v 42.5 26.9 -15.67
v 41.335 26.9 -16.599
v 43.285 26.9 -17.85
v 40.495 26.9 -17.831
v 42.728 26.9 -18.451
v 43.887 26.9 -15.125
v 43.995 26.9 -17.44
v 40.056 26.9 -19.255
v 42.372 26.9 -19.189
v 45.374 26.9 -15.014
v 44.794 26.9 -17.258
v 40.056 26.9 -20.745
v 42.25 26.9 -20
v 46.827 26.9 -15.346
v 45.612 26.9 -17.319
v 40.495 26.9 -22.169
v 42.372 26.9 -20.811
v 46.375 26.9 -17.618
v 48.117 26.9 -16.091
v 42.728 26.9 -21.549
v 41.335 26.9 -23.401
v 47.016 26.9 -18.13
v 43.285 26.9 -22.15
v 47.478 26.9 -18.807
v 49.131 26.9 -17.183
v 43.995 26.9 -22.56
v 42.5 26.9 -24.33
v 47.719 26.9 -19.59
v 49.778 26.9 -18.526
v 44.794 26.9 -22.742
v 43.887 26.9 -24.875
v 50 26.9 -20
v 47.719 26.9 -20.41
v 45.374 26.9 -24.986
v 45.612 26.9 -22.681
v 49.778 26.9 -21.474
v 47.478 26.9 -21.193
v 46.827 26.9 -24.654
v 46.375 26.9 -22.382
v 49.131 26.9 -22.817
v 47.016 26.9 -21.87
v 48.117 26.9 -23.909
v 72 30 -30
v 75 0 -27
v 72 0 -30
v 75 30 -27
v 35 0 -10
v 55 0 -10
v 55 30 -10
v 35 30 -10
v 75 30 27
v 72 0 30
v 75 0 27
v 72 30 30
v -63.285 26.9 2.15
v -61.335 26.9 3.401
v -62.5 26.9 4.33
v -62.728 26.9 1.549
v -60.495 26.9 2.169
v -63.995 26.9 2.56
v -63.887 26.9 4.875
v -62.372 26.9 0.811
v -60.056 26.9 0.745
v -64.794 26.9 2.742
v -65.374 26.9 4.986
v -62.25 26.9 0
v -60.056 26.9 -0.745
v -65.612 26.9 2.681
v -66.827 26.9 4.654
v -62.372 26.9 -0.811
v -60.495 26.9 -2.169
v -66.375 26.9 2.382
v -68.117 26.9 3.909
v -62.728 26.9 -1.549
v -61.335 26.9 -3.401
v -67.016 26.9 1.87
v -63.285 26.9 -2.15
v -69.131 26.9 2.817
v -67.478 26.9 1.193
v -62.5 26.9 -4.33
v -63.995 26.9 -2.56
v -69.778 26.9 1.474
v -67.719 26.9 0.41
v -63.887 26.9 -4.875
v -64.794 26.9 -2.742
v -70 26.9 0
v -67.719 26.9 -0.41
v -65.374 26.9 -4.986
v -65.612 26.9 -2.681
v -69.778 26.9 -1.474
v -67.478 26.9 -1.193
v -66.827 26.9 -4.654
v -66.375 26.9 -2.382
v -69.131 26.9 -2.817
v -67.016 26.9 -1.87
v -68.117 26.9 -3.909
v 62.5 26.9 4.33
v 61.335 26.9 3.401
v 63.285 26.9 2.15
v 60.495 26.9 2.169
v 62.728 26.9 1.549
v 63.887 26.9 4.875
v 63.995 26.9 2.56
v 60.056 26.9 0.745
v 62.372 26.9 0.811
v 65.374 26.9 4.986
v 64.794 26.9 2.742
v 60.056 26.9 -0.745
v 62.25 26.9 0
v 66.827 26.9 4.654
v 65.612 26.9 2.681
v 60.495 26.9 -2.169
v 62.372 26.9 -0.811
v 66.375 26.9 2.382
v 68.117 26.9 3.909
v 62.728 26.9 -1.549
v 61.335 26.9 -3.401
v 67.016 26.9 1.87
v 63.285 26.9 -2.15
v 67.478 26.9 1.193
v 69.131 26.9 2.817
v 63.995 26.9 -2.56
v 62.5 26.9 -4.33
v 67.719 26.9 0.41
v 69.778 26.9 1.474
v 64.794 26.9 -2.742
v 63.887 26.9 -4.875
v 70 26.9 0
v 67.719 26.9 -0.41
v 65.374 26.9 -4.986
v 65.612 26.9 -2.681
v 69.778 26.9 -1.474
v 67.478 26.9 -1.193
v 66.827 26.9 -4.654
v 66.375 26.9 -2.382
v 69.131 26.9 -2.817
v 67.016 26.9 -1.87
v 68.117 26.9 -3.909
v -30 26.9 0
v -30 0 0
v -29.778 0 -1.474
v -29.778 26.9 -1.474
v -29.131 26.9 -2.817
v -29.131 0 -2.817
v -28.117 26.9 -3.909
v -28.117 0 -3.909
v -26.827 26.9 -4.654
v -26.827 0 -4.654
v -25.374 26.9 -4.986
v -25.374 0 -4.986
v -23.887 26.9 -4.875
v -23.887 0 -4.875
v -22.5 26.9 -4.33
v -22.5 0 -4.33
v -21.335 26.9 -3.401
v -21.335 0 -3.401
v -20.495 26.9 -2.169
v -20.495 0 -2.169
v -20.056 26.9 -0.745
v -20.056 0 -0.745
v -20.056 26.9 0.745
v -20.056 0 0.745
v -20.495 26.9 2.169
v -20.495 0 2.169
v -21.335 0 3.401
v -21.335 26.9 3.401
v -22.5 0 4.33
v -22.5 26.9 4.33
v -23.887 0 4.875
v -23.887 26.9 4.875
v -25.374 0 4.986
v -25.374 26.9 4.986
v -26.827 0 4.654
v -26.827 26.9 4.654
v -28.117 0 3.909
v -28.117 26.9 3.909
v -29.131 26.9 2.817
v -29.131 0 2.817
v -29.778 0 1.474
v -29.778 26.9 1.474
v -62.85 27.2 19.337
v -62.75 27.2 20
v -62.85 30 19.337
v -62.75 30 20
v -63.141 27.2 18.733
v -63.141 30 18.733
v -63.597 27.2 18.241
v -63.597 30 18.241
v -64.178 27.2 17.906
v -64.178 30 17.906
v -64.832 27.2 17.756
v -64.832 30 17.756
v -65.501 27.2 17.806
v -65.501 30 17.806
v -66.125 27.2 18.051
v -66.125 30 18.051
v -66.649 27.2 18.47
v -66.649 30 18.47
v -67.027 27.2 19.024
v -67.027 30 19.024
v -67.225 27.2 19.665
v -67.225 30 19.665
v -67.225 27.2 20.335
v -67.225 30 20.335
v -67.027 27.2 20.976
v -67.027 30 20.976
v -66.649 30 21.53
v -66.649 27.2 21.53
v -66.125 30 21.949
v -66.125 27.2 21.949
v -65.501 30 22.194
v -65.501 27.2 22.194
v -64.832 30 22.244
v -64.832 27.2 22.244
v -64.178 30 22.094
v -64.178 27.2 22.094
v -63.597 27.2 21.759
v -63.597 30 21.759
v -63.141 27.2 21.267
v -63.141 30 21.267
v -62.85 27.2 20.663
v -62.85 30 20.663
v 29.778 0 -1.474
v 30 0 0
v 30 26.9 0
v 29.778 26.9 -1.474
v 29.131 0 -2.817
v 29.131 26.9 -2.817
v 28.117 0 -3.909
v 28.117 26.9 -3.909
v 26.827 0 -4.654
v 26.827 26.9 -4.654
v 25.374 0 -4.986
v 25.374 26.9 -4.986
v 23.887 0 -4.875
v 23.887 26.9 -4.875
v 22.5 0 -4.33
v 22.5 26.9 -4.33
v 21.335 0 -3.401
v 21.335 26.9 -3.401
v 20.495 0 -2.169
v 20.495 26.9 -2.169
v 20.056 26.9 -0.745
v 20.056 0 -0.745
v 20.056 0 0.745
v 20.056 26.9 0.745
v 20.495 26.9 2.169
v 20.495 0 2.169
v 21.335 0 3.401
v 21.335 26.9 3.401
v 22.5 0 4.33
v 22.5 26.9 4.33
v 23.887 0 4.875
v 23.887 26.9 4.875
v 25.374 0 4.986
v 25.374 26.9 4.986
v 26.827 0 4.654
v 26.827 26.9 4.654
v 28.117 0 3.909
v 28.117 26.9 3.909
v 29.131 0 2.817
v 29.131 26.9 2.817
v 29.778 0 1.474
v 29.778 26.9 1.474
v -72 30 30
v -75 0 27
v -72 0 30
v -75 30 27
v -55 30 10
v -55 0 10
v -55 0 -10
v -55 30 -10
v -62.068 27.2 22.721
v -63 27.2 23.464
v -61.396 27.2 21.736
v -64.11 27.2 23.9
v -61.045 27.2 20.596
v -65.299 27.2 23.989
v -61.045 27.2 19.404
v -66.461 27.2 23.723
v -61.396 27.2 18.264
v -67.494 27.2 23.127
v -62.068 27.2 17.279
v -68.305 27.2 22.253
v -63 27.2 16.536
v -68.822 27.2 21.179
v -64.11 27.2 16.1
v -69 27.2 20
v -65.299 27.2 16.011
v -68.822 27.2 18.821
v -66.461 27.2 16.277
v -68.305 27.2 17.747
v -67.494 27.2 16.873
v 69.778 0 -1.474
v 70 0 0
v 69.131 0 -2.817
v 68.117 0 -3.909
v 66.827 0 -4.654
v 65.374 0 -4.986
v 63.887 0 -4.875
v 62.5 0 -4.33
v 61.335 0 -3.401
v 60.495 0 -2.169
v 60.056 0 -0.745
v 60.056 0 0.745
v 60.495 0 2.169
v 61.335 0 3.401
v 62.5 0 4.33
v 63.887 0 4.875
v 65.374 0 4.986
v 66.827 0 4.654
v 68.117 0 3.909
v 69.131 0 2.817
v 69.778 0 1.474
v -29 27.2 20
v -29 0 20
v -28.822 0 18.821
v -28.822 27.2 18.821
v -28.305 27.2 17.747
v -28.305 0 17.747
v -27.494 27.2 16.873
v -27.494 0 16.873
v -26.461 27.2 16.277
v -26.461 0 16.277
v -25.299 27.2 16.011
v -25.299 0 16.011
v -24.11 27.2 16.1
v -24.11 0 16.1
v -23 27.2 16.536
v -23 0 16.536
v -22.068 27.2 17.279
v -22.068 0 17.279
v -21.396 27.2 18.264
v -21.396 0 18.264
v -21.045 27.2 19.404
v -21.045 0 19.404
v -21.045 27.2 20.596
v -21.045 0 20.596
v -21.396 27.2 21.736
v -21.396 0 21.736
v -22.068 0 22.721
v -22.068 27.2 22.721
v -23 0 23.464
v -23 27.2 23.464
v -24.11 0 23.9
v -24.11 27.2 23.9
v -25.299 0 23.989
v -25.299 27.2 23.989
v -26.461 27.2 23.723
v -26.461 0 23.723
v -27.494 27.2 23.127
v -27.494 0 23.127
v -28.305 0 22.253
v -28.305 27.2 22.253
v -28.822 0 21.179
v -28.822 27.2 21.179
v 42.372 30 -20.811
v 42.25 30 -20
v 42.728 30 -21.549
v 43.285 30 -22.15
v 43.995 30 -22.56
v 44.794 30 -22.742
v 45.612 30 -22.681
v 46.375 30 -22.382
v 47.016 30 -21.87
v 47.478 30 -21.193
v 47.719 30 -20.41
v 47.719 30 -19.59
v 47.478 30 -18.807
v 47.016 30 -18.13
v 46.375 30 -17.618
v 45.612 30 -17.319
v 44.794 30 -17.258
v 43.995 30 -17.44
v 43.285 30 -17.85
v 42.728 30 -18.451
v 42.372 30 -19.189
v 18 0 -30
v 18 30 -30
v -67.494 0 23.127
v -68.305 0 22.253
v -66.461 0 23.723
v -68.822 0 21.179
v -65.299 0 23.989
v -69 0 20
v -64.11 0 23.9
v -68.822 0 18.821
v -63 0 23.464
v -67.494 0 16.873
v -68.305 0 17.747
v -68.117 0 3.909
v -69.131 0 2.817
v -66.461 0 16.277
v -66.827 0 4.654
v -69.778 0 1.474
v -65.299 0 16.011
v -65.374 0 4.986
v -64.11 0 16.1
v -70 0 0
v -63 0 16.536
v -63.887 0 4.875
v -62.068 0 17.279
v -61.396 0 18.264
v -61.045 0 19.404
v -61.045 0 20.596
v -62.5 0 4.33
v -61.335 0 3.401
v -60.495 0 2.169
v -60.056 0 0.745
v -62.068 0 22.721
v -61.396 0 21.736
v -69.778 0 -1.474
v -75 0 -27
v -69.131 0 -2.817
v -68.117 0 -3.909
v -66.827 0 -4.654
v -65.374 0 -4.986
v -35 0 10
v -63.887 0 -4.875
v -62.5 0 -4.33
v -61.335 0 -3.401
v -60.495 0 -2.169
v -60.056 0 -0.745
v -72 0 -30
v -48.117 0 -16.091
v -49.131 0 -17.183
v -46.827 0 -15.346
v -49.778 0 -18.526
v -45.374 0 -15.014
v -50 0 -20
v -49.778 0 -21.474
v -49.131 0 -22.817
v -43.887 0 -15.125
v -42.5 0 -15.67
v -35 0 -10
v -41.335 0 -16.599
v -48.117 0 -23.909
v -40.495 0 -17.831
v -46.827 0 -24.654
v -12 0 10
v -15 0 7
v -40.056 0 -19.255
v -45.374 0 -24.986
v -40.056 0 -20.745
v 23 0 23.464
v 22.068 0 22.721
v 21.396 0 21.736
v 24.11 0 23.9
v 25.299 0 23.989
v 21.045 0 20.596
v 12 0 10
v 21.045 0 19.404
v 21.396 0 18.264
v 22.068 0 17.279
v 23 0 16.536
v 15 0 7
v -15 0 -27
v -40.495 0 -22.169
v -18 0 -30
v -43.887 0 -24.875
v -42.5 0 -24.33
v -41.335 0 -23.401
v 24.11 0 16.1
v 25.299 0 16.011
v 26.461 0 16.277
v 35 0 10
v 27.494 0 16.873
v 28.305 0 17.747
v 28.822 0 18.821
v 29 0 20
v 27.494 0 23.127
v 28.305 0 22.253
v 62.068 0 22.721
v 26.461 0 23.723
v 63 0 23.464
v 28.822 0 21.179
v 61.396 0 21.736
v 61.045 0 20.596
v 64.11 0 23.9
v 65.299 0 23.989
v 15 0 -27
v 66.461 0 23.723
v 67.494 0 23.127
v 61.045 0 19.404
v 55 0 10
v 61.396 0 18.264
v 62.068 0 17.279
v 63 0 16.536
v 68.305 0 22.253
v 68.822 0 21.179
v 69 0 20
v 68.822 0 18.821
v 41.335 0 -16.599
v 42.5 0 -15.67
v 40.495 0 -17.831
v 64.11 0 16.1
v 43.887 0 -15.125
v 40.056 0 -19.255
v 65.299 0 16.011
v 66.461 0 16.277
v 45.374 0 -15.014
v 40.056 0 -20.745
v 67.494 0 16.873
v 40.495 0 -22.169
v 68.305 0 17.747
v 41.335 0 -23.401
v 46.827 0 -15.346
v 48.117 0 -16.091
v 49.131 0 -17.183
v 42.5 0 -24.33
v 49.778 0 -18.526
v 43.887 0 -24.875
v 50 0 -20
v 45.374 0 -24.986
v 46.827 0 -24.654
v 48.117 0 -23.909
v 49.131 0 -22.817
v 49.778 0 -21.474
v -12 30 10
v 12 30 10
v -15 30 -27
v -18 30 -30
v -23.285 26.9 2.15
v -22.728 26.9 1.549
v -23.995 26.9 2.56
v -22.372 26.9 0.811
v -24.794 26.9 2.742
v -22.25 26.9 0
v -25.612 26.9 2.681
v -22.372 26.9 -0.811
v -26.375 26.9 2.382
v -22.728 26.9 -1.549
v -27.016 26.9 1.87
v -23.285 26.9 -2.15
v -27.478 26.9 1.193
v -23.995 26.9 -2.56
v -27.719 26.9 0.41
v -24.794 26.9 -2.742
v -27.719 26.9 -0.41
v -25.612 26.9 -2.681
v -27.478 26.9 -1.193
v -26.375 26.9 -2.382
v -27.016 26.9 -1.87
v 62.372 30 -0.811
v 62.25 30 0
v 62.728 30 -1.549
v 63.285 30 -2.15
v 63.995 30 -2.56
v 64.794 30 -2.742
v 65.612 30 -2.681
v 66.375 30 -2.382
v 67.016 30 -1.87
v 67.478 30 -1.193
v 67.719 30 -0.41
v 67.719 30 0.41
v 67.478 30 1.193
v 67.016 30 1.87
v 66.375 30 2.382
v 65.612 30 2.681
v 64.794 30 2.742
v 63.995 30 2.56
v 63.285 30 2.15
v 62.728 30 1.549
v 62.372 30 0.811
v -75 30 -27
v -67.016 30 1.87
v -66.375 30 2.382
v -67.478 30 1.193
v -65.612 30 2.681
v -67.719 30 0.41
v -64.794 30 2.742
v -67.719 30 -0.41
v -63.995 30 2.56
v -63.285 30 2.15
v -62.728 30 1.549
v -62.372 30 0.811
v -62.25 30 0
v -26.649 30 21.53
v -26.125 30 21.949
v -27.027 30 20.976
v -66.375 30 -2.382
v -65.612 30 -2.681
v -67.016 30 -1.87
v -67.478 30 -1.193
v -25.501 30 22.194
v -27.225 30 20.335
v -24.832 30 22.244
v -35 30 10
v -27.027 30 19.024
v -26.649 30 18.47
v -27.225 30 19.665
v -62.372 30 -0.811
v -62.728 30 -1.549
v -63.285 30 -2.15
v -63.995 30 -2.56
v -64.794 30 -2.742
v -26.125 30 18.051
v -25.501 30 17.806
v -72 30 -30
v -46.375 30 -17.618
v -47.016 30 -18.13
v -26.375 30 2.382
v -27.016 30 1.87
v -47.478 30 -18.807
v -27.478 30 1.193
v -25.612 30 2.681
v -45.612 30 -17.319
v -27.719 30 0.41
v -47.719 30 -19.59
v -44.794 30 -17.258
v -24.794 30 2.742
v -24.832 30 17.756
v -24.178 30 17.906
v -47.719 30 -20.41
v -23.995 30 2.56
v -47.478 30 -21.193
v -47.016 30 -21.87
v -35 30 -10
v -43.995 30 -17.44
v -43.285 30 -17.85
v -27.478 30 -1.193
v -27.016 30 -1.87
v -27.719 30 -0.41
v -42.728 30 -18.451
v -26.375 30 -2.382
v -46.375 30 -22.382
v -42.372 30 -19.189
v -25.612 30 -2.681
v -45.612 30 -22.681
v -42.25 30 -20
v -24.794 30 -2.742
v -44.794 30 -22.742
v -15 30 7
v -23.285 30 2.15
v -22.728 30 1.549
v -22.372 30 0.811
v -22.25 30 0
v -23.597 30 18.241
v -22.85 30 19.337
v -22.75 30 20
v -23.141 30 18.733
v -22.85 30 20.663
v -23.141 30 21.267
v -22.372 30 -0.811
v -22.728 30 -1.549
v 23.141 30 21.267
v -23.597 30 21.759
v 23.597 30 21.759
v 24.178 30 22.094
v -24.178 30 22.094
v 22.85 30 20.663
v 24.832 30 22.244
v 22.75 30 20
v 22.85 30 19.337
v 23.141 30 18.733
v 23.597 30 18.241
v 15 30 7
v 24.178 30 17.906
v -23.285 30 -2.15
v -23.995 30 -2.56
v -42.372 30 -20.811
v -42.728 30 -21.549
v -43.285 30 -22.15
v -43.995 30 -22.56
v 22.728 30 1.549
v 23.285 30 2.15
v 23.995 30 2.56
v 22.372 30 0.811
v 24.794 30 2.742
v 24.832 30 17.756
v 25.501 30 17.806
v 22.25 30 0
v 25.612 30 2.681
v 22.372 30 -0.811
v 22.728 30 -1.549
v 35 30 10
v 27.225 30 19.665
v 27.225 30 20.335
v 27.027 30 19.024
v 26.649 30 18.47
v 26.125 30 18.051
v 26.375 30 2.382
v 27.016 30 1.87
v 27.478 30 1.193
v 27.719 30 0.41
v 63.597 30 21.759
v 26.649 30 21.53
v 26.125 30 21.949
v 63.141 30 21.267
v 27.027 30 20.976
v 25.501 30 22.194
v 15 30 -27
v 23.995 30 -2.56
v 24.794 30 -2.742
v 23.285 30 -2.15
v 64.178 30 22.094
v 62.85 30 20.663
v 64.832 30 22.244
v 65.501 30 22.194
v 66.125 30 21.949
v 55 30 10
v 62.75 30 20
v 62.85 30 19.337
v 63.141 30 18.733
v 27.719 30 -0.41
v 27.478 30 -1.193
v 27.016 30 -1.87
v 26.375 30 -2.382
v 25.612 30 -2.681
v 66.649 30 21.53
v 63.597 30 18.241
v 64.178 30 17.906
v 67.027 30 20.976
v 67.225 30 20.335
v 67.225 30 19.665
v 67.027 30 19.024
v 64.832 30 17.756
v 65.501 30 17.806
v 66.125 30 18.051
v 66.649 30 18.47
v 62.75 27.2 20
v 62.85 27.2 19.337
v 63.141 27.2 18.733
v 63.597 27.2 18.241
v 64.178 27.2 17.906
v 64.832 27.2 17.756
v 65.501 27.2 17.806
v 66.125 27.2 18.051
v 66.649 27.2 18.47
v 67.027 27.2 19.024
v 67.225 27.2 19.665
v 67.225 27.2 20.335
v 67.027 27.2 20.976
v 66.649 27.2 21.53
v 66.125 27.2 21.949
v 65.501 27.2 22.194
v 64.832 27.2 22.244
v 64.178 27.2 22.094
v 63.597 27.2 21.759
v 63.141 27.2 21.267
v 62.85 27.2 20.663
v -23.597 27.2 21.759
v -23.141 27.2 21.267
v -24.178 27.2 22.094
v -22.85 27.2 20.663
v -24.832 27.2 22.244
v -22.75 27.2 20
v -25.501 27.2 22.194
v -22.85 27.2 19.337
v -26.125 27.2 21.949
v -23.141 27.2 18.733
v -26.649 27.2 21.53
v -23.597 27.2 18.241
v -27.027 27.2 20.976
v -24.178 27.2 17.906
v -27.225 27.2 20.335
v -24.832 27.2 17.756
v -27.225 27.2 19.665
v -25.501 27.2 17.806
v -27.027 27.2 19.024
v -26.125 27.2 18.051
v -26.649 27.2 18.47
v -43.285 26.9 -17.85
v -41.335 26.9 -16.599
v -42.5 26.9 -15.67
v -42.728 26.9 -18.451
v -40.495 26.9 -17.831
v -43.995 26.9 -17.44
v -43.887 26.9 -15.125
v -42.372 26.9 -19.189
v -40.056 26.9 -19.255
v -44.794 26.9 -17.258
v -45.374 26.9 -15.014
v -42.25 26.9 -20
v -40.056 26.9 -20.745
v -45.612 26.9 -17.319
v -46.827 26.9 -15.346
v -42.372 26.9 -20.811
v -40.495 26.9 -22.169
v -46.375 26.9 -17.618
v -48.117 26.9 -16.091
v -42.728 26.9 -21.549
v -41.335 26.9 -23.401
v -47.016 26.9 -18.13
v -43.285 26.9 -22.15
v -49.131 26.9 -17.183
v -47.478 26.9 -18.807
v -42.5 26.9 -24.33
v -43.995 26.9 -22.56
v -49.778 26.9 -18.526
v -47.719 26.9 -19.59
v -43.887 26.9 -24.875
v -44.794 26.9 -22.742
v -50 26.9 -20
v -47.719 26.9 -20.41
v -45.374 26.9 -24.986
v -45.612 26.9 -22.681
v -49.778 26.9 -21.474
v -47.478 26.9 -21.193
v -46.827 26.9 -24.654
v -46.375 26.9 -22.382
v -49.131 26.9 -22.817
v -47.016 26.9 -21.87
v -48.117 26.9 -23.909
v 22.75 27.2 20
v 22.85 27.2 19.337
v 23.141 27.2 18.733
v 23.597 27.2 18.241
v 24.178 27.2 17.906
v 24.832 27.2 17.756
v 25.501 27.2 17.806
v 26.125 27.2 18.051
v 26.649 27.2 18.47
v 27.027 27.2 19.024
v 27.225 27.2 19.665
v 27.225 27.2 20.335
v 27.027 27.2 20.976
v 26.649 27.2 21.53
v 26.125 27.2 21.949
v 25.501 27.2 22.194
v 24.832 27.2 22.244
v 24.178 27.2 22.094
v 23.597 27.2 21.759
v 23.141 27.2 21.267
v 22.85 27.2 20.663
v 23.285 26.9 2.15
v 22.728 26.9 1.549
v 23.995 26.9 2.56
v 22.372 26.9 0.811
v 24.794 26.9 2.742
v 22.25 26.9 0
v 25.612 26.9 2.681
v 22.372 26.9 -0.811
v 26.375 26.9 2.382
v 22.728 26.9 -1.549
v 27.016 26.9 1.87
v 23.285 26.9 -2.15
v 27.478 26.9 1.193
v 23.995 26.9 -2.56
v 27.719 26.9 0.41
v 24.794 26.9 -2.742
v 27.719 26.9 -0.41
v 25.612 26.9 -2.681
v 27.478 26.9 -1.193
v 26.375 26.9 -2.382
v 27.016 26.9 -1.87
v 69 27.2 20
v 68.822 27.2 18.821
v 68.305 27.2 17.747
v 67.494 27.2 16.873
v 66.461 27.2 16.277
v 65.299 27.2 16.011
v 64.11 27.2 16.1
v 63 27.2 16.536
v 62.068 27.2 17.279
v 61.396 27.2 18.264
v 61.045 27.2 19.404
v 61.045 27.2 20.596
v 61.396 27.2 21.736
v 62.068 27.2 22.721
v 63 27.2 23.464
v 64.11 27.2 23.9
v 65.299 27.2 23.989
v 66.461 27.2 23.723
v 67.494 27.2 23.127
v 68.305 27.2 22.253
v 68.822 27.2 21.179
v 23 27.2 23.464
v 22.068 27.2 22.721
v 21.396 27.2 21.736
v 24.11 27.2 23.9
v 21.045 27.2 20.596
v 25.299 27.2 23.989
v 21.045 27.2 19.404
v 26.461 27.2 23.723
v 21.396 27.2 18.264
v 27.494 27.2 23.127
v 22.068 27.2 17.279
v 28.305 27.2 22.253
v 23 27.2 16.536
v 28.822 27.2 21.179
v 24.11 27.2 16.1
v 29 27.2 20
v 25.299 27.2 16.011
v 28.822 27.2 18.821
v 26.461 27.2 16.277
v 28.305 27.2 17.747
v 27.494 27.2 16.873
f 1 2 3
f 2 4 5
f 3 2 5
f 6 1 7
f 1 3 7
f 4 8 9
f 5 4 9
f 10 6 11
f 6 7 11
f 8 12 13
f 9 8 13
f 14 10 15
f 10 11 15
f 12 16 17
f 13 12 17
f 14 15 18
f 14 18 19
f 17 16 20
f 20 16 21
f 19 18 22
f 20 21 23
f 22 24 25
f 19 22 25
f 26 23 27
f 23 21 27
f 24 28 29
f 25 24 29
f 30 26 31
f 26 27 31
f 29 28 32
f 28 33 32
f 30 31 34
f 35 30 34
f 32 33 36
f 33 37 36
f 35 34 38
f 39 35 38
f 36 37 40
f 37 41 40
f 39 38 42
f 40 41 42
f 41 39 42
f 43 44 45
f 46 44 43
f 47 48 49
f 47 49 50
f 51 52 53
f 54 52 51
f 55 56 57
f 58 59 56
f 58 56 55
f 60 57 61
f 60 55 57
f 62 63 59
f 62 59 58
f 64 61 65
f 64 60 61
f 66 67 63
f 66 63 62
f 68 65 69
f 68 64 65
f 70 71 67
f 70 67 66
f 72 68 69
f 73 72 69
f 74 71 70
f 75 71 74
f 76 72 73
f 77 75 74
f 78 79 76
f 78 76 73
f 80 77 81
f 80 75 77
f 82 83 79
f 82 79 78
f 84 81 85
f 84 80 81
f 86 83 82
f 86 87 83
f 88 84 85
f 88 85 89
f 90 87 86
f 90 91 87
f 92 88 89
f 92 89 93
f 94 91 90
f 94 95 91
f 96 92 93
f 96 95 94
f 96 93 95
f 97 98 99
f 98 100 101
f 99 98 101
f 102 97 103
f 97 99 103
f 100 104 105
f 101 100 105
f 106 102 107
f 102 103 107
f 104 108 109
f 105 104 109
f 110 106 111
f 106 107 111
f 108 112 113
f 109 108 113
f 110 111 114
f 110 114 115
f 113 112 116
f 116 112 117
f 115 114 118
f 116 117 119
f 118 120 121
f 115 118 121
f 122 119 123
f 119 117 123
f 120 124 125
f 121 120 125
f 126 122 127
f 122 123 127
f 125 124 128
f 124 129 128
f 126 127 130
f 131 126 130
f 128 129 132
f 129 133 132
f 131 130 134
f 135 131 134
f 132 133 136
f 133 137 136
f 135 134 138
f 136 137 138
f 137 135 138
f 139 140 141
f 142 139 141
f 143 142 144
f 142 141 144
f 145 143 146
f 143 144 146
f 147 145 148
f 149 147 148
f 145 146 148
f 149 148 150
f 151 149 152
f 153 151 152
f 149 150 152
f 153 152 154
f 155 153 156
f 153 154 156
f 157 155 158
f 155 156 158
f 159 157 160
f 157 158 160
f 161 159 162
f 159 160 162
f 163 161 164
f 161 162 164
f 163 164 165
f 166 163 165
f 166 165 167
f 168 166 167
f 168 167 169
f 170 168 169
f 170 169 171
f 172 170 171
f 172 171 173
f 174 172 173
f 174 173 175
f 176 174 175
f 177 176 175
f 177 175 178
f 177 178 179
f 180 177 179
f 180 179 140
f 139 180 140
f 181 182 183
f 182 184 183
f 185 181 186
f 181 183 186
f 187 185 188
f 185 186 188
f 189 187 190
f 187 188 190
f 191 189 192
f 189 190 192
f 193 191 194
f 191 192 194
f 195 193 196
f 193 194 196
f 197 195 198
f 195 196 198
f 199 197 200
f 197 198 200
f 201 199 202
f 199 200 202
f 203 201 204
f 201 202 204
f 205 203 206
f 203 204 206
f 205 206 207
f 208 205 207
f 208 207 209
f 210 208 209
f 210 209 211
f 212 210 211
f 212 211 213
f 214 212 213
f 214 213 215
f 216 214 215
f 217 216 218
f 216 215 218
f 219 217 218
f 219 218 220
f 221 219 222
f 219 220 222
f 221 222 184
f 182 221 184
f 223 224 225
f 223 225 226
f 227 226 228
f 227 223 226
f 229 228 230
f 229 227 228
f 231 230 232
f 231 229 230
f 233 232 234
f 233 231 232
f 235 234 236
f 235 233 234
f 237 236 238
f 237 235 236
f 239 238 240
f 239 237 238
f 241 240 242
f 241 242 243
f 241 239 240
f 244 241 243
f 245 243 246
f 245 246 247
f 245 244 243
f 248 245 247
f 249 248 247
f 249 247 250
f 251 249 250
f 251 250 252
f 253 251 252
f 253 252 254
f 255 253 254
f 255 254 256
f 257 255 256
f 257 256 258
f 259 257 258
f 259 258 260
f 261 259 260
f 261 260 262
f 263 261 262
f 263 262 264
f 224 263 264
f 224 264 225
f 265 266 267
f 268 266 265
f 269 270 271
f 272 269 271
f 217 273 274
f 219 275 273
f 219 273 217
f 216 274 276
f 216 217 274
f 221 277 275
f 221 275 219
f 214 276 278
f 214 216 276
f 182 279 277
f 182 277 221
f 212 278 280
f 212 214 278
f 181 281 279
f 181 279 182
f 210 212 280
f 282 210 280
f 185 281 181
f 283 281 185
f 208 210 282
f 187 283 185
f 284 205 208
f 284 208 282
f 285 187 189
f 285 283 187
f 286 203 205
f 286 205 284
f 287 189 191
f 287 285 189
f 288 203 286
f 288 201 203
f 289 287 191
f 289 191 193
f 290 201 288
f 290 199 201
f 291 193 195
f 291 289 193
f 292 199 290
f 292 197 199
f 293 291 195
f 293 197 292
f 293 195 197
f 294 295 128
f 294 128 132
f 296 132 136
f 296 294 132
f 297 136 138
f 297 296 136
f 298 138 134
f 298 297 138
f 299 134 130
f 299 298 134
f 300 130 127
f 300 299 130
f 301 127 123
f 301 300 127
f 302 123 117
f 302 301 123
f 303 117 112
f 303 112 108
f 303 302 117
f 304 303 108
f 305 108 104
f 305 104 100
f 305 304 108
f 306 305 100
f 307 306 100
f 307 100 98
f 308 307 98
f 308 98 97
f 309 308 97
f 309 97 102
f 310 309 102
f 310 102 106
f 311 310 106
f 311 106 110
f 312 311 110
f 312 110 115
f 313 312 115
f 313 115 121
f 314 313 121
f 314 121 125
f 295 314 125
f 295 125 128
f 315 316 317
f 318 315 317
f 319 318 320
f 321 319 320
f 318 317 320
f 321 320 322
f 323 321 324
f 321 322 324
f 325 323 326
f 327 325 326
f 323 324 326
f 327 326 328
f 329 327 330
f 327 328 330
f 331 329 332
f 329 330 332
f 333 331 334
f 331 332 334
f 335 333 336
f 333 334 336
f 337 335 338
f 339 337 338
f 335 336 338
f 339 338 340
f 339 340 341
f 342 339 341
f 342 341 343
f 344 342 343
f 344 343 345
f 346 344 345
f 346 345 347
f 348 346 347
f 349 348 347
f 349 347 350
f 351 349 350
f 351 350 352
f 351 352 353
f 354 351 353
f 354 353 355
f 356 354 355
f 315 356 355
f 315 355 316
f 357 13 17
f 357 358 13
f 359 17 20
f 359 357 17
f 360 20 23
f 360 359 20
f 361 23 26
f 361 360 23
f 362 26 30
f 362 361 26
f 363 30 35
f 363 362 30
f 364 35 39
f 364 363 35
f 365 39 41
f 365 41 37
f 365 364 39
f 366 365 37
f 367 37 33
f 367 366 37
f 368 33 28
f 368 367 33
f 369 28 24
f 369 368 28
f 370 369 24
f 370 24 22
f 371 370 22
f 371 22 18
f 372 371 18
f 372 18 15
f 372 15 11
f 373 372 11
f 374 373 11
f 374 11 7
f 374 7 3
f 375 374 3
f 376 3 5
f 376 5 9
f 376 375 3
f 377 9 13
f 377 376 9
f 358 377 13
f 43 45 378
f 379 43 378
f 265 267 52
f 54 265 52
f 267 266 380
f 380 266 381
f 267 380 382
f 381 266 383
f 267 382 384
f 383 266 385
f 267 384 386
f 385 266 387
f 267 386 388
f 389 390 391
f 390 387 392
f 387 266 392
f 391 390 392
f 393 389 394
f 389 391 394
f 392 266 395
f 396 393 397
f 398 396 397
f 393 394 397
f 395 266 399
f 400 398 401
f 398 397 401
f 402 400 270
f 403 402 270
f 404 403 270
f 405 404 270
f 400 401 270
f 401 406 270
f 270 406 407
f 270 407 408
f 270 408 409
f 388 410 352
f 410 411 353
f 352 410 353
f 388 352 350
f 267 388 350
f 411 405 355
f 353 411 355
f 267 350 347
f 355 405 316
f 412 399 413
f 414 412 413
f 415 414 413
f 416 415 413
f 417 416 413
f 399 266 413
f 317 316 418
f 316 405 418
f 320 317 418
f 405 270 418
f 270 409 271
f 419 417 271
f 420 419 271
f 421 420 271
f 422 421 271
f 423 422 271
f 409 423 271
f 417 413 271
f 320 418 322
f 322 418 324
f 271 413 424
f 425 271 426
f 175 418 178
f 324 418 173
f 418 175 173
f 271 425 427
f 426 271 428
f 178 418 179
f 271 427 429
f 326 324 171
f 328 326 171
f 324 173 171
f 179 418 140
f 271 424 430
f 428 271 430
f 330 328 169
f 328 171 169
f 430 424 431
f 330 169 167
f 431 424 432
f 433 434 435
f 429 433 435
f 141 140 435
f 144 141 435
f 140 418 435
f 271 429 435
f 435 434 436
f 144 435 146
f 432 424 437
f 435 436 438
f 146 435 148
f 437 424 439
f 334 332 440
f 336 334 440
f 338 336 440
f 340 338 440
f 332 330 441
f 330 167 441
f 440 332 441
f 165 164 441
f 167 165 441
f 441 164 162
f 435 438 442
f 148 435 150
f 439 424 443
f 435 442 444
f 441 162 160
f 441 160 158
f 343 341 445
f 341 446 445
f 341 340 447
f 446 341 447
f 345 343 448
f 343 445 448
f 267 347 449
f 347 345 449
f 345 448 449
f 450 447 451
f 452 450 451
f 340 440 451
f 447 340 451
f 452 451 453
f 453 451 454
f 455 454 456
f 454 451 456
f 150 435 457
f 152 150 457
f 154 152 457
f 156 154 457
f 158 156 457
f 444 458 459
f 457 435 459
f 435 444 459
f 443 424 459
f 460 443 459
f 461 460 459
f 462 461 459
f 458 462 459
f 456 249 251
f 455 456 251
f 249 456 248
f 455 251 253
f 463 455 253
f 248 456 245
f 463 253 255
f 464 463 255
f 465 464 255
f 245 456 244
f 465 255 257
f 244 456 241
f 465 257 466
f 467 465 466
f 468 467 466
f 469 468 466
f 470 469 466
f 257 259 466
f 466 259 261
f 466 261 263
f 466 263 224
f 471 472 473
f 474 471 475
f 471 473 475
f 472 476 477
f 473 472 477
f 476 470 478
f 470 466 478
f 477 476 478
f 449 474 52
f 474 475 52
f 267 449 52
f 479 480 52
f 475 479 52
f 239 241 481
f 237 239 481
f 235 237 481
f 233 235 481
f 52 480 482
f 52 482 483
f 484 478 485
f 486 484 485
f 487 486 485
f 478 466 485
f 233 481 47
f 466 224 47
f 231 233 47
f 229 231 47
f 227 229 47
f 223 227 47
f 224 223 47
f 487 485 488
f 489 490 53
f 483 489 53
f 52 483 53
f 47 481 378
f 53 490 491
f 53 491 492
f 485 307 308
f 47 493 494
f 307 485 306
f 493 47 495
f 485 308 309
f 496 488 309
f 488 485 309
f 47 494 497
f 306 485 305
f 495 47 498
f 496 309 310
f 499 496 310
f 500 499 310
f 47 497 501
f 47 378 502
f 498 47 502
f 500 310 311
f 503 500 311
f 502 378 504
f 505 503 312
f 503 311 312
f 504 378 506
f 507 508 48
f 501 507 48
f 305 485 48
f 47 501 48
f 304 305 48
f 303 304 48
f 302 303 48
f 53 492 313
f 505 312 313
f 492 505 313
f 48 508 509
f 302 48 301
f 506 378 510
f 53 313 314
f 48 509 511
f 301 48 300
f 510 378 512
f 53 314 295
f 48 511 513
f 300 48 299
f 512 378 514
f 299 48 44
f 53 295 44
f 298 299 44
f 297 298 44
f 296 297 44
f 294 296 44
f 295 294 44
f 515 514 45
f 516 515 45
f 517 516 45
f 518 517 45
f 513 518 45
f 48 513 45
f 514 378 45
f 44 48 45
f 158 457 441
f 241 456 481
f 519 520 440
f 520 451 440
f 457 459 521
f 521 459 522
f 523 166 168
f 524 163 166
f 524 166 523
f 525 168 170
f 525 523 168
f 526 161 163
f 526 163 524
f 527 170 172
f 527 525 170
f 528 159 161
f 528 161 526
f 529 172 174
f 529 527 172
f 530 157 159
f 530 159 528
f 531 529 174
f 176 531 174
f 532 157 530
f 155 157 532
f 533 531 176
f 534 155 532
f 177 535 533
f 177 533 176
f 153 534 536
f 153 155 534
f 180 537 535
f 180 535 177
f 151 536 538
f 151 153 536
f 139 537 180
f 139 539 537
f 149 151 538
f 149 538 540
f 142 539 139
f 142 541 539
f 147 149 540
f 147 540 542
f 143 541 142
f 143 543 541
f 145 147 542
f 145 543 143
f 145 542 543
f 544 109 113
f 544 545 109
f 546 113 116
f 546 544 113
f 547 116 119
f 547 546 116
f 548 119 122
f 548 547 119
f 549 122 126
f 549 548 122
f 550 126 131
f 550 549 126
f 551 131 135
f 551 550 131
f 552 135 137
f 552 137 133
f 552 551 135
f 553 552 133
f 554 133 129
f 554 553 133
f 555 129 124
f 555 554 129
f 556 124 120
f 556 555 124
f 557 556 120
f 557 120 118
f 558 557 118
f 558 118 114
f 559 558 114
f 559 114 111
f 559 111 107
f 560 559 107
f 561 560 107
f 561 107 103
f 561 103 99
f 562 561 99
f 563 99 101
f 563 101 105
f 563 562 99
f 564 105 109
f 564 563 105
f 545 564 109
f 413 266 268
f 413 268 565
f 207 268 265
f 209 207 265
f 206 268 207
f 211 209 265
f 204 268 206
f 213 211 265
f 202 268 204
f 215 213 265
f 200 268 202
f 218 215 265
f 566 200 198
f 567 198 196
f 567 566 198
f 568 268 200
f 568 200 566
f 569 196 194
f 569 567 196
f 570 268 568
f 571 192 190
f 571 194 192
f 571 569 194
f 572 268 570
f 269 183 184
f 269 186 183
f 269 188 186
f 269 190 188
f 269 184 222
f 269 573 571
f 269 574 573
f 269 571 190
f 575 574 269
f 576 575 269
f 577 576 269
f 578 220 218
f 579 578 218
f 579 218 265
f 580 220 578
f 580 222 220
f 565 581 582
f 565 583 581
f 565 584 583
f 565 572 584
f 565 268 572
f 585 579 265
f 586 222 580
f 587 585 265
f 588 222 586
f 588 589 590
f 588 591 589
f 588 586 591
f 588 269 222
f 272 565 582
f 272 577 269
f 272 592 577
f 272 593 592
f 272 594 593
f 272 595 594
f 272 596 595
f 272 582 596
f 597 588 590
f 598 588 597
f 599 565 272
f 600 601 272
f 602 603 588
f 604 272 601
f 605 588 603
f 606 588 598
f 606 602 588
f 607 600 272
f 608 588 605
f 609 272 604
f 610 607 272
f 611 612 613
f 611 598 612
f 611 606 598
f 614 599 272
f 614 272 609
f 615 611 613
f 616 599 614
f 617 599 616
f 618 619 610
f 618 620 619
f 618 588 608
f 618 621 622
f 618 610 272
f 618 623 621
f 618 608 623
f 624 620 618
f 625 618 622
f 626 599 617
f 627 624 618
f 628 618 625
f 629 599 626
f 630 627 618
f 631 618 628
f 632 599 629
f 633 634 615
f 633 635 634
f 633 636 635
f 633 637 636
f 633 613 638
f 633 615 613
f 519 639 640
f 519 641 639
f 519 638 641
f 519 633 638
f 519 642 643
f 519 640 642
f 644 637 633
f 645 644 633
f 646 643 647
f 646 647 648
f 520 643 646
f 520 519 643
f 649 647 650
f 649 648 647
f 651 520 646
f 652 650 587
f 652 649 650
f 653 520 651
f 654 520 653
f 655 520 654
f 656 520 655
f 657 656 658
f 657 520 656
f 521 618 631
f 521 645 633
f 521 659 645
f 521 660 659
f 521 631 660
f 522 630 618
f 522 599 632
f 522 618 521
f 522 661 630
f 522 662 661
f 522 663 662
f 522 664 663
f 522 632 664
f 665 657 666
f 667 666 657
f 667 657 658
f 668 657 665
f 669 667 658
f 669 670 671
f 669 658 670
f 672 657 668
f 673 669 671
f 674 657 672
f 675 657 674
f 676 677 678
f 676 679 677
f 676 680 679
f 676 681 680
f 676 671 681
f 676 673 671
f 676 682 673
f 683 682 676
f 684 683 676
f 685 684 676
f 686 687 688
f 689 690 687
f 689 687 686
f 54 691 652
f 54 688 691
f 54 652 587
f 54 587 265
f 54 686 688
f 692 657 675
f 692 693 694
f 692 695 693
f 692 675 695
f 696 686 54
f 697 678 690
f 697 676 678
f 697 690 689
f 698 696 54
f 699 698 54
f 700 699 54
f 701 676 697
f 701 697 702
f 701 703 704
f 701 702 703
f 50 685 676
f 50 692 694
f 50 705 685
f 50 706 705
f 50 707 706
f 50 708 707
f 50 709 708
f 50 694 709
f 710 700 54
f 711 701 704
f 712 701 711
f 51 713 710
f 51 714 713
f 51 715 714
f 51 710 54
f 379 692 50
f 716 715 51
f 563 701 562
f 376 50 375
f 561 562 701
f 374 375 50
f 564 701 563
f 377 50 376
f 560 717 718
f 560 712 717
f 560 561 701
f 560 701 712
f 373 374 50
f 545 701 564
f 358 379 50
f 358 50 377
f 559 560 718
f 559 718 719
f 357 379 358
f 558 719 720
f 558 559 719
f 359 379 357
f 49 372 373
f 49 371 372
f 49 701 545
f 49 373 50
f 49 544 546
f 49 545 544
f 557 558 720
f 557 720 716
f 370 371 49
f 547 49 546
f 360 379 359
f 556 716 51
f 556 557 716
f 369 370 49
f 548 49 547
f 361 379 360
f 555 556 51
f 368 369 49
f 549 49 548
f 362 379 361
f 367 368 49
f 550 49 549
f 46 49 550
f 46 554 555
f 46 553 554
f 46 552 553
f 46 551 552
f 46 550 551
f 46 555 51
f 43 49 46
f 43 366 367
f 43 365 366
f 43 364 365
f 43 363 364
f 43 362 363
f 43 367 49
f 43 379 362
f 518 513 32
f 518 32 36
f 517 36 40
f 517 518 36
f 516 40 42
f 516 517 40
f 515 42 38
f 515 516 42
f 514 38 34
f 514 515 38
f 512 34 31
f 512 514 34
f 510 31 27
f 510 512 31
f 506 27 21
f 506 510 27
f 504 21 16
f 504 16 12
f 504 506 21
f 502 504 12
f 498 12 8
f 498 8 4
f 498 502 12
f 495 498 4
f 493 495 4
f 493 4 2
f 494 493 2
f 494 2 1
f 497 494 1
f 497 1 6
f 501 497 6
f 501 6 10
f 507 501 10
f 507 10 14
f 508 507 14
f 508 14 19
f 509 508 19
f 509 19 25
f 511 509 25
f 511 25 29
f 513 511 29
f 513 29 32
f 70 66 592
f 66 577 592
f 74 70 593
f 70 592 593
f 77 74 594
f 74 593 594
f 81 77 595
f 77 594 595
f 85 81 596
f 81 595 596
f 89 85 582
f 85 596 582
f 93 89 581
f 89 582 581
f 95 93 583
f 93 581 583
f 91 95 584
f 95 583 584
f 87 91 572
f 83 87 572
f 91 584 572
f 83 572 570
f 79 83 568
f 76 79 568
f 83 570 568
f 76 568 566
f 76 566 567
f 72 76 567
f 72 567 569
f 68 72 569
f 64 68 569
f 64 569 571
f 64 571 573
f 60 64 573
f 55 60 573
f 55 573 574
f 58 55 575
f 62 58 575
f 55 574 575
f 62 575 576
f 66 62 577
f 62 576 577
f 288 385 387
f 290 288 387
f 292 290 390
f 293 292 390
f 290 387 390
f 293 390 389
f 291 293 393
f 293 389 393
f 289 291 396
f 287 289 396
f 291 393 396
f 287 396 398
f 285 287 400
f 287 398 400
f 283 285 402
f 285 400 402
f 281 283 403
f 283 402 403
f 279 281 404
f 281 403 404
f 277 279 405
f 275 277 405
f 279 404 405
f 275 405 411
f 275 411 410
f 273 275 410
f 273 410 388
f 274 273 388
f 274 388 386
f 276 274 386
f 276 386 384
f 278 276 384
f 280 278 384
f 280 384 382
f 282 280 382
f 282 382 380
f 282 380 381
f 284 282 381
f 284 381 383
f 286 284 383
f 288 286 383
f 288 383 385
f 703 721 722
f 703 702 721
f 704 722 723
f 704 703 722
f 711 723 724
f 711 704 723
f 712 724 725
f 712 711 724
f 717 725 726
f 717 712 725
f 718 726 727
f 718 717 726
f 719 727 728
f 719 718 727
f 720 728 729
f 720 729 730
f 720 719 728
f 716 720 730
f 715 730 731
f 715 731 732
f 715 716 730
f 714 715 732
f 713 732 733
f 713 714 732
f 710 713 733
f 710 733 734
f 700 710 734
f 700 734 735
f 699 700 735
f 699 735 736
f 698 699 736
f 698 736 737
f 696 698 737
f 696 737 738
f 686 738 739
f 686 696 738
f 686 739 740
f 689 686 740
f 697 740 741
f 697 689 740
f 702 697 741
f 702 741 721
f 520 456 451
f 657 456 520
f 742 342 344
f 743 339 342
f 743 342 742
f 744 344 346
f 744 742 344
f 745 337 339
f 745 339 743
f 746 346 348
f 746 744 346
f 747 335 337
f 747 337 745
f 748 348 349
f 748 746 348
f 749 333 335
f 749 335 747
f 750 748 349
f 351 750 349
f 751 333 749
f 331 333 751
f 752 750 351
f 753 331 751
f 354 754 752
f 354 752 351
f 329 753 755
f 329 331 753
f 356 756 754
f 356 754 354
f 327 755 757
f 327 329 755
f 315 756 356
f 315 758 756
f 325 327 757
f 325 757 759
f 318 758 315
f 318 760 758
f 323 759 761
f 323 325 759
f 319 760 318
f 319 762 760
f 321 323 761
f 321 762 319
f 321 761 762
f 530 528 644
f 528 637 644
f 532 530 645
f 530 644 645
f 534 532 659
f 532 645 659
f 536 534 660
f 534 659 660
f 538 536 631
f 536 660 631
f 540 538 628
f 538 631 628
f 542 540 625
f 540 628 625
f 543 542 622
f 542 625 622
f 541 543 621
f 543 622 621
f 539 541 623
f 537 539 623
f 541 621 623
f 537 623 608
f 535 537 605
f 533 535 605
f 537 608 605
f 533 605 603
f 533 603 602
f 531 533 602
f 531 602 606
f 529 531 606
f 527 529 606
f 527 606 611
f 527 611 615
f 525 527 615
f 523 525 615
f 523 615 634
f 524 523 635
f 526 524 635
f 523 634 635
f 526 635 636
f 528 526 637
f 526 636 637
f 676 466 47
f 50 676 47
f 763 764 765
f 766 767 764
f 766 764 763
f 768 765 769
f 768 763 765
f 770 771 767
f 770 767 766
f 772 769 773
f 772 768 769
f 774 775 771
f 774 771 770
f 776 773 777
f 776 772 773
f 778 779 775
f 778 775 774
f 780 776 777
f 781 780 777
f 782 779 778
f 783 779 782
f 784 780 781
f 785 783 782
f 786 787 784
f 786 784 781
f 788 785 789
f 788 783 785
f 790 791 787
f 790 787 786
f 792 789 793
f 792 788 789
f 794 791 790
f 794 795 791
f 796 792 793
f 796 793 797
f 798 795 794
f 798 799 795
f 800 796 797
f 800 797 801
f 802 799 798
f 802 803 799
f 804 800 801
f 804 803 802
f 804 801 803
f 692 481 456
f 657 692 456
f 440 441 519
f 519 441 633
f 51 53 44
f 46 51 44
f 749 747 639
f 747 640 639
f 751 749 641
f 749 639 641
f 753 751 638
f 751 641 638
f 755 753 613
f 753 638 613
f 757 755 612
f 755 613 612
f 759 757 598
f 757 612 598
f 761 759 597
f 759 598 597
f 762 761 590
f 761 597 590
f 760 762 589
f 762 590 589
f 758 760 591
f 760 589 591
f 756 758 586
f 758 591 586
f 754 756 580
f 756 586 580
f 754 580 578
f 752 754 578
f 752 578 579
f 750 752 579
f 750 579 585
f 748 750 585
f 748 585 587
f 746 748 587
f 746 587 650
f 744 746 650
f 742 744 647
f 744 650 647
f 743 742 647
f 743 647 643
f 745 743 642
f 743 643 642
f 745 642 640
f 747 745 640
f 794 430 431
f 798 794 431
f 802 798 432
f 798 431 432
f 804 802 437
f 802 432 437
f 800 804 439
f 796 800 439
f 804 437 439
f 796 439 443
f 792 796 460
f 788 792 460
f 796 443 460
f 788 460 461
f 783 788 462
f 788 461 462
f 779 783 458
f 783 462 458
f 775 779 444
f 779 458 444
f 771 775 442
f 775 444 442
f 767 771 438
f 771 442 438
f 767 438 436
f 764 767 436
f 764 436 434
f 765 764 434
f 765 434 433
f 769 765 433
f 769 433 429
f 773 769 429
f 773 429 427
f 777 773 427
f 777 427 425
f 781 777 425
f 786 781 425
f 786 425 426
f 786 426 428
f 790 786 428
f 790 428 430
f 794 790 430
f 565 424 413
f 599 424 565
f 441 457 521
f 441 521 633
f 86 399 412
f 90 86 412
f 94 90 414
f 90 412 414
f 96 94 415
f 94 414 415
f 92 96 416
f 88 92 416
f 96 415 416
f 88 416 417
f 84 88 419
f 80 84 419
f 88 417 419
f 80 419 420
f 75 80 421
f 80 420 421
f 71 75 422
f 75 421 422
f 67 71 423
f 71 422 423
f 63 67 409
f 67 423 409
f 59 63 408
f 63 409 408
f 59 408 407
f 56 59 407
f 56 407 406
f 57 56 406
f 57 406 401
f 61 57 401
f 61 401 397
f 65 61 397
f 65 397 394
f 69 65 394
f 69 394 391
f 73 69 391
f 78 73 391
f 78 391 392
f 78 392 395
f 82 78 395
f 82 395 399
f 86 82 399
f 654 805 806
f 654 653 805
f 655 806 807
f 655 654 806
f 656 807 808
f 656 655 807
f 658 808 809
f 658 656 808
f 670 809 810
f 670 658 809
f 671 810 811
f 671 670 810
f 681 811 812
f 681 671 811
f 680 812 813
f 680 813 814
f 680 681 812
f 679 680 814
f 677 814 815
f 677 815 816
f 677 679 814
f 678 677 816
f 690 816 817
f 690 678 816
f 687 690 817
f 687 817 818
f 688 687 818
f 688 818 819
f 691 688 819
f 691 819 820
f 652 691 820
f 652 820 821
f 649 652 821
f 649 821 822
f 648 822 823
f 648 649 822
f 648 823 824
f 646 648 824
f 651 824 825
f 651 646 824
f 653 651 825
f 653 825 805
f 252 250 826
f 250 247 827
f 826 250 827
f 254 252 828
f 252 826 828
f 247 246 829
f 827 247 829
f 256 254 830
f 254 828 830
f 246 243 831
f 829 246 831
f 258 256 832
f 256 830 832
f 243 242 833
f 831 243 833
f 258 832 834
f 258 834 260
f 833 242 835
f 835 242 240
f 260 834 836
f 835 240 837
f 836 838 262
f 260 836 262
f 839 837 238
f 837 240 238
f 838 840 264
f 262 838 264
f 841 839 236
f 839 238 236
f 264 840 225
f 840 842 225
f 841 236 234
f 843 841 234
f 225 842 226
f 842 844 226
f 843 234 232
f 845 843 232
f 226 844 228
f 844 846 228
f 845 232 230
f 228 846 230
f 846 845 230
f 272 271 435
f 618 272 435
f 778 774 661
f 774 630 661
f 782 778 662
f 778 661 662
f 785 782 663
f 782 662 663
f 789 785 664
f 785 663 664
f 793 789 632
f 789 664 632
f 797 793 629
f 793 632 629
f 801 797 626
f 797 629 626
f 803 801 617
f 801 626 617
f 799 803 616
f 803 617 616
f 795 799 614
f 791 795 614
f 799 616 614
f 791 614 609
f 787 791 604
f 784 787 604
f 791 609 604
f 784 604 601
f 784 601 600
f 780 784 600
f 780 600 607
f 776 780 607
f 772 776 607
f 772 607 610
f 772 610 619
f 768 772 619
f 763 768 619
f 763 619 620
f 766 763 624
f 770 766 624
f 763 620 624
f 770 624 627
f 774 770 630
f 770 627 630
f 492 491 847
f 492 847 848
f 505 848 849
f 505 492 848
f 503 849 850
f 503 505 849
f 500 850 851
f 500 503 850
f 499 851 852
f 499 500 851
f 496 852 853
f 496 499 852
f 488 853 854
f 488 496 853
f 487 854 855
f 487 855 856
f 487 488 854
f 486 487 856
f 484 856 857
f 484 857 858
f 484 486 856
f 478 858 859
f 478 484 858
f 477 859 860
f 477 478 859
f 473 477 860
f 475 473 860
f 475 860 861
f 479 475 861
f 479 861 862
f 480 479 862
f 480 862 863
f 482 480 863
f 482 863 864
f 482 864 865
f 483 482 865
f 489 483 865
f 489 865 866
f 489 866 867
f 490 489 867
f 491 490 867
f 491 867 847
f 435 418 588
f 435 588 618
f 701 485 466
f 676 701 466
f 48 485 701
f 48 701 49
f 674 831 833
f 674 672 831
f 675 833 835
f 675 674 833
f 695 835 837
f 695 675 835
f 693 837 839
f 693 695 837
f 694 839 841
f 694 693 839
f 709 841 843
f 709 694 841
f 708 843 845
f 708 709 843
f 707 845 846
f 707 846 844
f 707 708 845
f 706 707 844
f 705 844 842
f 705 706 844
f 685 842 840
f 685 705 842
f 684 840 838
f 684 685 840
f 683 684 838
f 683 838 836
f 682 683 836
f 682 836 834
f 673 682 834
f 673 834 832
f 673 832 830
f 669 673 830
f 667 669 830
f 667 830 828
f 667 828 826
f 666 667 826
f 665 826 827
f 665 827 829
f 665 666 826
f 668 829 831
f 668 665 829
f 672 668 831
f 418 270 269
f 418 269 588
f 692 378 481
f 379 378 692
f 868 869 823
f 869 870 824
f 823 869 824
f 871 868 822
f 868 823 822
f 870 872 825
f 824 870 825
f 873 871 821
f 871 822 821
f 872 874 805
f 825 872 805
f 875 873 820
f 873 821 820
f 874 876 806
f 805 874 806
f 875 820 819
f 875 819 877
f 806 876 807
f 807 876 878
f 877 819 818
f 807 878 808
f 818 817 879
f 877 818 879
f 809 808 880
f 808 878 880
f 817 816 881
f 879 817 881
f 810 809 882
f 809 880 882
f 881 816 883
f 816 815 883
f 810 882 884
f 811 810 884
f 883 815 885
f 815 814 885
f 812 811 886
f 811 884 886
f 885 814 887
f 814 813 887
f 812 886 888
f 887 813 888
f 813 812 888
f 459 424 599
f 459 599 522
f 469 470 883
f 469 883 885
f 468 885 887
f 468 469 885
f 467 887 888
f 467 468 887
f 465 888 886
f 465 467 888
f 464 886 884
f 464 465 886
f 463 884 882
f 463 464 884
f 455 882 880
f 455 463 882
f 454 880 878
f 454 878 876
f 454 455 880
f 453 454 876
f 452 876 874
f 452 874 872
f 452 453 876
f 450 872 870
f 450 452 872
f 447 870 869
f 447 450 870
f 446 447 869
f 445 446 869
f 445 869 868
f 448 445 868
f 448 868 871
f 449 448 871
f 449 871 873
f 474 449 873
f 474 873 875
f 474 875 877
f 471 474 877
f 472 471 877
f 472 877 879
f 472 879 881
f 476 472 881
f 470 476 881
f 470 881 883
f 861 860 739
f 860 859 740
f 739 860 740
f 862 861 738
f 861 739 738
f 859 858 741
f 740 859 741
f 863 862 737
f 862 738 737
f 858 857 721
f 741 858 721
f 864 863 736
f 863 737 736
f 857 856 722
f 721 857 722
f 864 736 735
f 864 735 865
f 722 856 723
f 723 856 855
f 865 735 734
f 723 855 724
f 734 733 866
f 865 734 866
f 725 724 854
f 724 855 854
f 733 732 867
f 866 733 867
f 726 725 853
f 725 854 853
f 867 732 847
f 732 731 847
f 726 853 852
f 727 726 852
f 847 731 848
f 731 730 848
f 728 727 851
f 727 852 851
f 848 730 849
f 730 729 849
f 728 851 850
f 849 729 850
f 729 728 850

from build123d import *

# Parameters (mm, degrees)
SKIZZE1_W                                            = 20
SKIZZE1_H                                            = 20
AUFSATZ_LINEAR_AUSTRAGEN1_DEPTH                      = 30
STIRNSENKUNG_F_R_M5_ZYLINDERSCHRAUBE_MIT_D           = 5.5
STIRNSENKUNG_F_R_M5_ZYLINDERSCHRAUBE_MIT_CBORE_D     = 10
STIRNSENKUNG_F_R_M5_ZYLINDERSCHRAUBE_MIT_CBORE_DEPTH = 26.9
STIRNSENKUNG_F_R_M4_ZYLINDERSCHRAUBE_MIT_D           = 4.5
STIRNSENKUNG_F_R_M4_ZYLINDERSCHRAUBE_MIT_CBORE_D     = 8
STIRNSENKUNG_F_R_M4_ZYLINDERSCHRAUBE_MIT_CBORE_DEPTH = 27.2
FASE1_SIZE                                           = 3
FASE1_OF_SPIEGELN2_SIZE                              = 3


with BuildPart() as part:
    # Skizze1 → Aufsatz-Linear austragen1 (new body)
    with BuildSketch(Plane(origin=(0, 0, 0), x_dir=(1, 0, 0), z_dir=(0, 1, 0))):
        Polygon((0, -10), (0, -30), (-75, -30), (-75, 30), (-15, 30), (-15, -10), align=None)
        with Locations((-45, 0)):
            Rectangle(SKIZZE1_W, SKIZZE1_H, mode=Mode.SUBTRACT)
    aufsatz_linear_austragen1 = extrude(amount=AUFSATZ_LINEAR_AUSTRAGEN1_DEPTH)

    # Stirnsenkung für M5 Zylinderschraube mit Innensechskant1 (through all)
    with Locations(Plane(origin=(0, 0, 0), x_dir=(-1, 0, 0), z_dir=(0, -1, 0))):
        with Locations((45, 20), (25, 0), (65, 0)):
            stirnsenkung_f_r_m5_zylinderschraube_mit = CounterBoreHole(STIRNSENKUNG_F_R_M5_ZYLINDERSCHRAUBE_MIT_D / 2, STIRNSENKUNG_F_R_M5_ZYLINDERSCHRAUBE_MIT_CBORE_D / 2, STIRNSENKUNG_F_R_M5_ZYLINDERSCHRAUBE_MIT_CBORE_DEPTH)

    # Stirnsenkung für M4 Zylinderschraube mit Innensechskant1 (through all)
    with Locations(Plane(origin=(0, 0, 0), x_dir=(-1, 0, 0), z_dir=(0, -1, 0))):
        with Locations((25, -20), (65, -20)):
            stirnsenkung_f_r_m4_zylinderschraube_mit = CounterBoreHole(STIRNSENKUNG_F_R_M4_ZYLINDERSCHRAUBE_MIT_D / 2, STIRNSENKUNG_F_R_M4_ZYLINDERSCHRAUBE_MIT_CBORE_D / 2, STIRNSENKUNG_F_R_M4_ZYLINDERSCHRAUBE_MIT_CBORE_DEPTH)

    # Fase1
    fase1_edges = [part.edges().sort_by_distance(p)[0] for p in [
        (-75, 15, -30),
        (-15, 15, -30),
        (-15, 15, 10),
        (-75, 15, 30),
    ]]
    chamfer(fase1_edges, length=FASE1_SIZE)

    # Spiegeln2: Aufsatz-Linear austragen1, Stirnsenkung für M5 Zylinderschraube mit Innensechskant1, Stirnsenkung für M4 Zylinderschraube mit Innensechskant1 across plane
    add(aufsatz_linear_austragen1.mirror(Plane(origin=(0, 0, 0), x_dir=(0, 0, 1), z_dir=(1, 0, 0))))
    add(stirnsenkung_f_r_m5_zylinderschraube_mit.mirror(Plane(origin=(0, 0, 0), x_dir=(0, 0, 1), z_dir=(1, 0, 0))), mode=Mode.SUBTRACT)
    add(stirnsenkung_f_r_m4_zylinderschraube_mit.mirror(Plane(origin=(0, 0, 0), x_dir=(0, 0, 1), z_dir=(1, 0, 0))), mode=Mode.SUBTRACT)

    # Fase1 of Spiegeln2
    fase1_of_spiegeln2_edges = [part.edges().sort_by_distance(p)[0] for p in [
        (75, 15, -30),
        (15, 15, -30),
        (15, 15, 10),
        (75, 15, 30),
    ]]
    chamfer(fase1_of_spiegeln2_edges, length=FASE1_OF_SPIEGELN2_SIZE)


solid = part.part
